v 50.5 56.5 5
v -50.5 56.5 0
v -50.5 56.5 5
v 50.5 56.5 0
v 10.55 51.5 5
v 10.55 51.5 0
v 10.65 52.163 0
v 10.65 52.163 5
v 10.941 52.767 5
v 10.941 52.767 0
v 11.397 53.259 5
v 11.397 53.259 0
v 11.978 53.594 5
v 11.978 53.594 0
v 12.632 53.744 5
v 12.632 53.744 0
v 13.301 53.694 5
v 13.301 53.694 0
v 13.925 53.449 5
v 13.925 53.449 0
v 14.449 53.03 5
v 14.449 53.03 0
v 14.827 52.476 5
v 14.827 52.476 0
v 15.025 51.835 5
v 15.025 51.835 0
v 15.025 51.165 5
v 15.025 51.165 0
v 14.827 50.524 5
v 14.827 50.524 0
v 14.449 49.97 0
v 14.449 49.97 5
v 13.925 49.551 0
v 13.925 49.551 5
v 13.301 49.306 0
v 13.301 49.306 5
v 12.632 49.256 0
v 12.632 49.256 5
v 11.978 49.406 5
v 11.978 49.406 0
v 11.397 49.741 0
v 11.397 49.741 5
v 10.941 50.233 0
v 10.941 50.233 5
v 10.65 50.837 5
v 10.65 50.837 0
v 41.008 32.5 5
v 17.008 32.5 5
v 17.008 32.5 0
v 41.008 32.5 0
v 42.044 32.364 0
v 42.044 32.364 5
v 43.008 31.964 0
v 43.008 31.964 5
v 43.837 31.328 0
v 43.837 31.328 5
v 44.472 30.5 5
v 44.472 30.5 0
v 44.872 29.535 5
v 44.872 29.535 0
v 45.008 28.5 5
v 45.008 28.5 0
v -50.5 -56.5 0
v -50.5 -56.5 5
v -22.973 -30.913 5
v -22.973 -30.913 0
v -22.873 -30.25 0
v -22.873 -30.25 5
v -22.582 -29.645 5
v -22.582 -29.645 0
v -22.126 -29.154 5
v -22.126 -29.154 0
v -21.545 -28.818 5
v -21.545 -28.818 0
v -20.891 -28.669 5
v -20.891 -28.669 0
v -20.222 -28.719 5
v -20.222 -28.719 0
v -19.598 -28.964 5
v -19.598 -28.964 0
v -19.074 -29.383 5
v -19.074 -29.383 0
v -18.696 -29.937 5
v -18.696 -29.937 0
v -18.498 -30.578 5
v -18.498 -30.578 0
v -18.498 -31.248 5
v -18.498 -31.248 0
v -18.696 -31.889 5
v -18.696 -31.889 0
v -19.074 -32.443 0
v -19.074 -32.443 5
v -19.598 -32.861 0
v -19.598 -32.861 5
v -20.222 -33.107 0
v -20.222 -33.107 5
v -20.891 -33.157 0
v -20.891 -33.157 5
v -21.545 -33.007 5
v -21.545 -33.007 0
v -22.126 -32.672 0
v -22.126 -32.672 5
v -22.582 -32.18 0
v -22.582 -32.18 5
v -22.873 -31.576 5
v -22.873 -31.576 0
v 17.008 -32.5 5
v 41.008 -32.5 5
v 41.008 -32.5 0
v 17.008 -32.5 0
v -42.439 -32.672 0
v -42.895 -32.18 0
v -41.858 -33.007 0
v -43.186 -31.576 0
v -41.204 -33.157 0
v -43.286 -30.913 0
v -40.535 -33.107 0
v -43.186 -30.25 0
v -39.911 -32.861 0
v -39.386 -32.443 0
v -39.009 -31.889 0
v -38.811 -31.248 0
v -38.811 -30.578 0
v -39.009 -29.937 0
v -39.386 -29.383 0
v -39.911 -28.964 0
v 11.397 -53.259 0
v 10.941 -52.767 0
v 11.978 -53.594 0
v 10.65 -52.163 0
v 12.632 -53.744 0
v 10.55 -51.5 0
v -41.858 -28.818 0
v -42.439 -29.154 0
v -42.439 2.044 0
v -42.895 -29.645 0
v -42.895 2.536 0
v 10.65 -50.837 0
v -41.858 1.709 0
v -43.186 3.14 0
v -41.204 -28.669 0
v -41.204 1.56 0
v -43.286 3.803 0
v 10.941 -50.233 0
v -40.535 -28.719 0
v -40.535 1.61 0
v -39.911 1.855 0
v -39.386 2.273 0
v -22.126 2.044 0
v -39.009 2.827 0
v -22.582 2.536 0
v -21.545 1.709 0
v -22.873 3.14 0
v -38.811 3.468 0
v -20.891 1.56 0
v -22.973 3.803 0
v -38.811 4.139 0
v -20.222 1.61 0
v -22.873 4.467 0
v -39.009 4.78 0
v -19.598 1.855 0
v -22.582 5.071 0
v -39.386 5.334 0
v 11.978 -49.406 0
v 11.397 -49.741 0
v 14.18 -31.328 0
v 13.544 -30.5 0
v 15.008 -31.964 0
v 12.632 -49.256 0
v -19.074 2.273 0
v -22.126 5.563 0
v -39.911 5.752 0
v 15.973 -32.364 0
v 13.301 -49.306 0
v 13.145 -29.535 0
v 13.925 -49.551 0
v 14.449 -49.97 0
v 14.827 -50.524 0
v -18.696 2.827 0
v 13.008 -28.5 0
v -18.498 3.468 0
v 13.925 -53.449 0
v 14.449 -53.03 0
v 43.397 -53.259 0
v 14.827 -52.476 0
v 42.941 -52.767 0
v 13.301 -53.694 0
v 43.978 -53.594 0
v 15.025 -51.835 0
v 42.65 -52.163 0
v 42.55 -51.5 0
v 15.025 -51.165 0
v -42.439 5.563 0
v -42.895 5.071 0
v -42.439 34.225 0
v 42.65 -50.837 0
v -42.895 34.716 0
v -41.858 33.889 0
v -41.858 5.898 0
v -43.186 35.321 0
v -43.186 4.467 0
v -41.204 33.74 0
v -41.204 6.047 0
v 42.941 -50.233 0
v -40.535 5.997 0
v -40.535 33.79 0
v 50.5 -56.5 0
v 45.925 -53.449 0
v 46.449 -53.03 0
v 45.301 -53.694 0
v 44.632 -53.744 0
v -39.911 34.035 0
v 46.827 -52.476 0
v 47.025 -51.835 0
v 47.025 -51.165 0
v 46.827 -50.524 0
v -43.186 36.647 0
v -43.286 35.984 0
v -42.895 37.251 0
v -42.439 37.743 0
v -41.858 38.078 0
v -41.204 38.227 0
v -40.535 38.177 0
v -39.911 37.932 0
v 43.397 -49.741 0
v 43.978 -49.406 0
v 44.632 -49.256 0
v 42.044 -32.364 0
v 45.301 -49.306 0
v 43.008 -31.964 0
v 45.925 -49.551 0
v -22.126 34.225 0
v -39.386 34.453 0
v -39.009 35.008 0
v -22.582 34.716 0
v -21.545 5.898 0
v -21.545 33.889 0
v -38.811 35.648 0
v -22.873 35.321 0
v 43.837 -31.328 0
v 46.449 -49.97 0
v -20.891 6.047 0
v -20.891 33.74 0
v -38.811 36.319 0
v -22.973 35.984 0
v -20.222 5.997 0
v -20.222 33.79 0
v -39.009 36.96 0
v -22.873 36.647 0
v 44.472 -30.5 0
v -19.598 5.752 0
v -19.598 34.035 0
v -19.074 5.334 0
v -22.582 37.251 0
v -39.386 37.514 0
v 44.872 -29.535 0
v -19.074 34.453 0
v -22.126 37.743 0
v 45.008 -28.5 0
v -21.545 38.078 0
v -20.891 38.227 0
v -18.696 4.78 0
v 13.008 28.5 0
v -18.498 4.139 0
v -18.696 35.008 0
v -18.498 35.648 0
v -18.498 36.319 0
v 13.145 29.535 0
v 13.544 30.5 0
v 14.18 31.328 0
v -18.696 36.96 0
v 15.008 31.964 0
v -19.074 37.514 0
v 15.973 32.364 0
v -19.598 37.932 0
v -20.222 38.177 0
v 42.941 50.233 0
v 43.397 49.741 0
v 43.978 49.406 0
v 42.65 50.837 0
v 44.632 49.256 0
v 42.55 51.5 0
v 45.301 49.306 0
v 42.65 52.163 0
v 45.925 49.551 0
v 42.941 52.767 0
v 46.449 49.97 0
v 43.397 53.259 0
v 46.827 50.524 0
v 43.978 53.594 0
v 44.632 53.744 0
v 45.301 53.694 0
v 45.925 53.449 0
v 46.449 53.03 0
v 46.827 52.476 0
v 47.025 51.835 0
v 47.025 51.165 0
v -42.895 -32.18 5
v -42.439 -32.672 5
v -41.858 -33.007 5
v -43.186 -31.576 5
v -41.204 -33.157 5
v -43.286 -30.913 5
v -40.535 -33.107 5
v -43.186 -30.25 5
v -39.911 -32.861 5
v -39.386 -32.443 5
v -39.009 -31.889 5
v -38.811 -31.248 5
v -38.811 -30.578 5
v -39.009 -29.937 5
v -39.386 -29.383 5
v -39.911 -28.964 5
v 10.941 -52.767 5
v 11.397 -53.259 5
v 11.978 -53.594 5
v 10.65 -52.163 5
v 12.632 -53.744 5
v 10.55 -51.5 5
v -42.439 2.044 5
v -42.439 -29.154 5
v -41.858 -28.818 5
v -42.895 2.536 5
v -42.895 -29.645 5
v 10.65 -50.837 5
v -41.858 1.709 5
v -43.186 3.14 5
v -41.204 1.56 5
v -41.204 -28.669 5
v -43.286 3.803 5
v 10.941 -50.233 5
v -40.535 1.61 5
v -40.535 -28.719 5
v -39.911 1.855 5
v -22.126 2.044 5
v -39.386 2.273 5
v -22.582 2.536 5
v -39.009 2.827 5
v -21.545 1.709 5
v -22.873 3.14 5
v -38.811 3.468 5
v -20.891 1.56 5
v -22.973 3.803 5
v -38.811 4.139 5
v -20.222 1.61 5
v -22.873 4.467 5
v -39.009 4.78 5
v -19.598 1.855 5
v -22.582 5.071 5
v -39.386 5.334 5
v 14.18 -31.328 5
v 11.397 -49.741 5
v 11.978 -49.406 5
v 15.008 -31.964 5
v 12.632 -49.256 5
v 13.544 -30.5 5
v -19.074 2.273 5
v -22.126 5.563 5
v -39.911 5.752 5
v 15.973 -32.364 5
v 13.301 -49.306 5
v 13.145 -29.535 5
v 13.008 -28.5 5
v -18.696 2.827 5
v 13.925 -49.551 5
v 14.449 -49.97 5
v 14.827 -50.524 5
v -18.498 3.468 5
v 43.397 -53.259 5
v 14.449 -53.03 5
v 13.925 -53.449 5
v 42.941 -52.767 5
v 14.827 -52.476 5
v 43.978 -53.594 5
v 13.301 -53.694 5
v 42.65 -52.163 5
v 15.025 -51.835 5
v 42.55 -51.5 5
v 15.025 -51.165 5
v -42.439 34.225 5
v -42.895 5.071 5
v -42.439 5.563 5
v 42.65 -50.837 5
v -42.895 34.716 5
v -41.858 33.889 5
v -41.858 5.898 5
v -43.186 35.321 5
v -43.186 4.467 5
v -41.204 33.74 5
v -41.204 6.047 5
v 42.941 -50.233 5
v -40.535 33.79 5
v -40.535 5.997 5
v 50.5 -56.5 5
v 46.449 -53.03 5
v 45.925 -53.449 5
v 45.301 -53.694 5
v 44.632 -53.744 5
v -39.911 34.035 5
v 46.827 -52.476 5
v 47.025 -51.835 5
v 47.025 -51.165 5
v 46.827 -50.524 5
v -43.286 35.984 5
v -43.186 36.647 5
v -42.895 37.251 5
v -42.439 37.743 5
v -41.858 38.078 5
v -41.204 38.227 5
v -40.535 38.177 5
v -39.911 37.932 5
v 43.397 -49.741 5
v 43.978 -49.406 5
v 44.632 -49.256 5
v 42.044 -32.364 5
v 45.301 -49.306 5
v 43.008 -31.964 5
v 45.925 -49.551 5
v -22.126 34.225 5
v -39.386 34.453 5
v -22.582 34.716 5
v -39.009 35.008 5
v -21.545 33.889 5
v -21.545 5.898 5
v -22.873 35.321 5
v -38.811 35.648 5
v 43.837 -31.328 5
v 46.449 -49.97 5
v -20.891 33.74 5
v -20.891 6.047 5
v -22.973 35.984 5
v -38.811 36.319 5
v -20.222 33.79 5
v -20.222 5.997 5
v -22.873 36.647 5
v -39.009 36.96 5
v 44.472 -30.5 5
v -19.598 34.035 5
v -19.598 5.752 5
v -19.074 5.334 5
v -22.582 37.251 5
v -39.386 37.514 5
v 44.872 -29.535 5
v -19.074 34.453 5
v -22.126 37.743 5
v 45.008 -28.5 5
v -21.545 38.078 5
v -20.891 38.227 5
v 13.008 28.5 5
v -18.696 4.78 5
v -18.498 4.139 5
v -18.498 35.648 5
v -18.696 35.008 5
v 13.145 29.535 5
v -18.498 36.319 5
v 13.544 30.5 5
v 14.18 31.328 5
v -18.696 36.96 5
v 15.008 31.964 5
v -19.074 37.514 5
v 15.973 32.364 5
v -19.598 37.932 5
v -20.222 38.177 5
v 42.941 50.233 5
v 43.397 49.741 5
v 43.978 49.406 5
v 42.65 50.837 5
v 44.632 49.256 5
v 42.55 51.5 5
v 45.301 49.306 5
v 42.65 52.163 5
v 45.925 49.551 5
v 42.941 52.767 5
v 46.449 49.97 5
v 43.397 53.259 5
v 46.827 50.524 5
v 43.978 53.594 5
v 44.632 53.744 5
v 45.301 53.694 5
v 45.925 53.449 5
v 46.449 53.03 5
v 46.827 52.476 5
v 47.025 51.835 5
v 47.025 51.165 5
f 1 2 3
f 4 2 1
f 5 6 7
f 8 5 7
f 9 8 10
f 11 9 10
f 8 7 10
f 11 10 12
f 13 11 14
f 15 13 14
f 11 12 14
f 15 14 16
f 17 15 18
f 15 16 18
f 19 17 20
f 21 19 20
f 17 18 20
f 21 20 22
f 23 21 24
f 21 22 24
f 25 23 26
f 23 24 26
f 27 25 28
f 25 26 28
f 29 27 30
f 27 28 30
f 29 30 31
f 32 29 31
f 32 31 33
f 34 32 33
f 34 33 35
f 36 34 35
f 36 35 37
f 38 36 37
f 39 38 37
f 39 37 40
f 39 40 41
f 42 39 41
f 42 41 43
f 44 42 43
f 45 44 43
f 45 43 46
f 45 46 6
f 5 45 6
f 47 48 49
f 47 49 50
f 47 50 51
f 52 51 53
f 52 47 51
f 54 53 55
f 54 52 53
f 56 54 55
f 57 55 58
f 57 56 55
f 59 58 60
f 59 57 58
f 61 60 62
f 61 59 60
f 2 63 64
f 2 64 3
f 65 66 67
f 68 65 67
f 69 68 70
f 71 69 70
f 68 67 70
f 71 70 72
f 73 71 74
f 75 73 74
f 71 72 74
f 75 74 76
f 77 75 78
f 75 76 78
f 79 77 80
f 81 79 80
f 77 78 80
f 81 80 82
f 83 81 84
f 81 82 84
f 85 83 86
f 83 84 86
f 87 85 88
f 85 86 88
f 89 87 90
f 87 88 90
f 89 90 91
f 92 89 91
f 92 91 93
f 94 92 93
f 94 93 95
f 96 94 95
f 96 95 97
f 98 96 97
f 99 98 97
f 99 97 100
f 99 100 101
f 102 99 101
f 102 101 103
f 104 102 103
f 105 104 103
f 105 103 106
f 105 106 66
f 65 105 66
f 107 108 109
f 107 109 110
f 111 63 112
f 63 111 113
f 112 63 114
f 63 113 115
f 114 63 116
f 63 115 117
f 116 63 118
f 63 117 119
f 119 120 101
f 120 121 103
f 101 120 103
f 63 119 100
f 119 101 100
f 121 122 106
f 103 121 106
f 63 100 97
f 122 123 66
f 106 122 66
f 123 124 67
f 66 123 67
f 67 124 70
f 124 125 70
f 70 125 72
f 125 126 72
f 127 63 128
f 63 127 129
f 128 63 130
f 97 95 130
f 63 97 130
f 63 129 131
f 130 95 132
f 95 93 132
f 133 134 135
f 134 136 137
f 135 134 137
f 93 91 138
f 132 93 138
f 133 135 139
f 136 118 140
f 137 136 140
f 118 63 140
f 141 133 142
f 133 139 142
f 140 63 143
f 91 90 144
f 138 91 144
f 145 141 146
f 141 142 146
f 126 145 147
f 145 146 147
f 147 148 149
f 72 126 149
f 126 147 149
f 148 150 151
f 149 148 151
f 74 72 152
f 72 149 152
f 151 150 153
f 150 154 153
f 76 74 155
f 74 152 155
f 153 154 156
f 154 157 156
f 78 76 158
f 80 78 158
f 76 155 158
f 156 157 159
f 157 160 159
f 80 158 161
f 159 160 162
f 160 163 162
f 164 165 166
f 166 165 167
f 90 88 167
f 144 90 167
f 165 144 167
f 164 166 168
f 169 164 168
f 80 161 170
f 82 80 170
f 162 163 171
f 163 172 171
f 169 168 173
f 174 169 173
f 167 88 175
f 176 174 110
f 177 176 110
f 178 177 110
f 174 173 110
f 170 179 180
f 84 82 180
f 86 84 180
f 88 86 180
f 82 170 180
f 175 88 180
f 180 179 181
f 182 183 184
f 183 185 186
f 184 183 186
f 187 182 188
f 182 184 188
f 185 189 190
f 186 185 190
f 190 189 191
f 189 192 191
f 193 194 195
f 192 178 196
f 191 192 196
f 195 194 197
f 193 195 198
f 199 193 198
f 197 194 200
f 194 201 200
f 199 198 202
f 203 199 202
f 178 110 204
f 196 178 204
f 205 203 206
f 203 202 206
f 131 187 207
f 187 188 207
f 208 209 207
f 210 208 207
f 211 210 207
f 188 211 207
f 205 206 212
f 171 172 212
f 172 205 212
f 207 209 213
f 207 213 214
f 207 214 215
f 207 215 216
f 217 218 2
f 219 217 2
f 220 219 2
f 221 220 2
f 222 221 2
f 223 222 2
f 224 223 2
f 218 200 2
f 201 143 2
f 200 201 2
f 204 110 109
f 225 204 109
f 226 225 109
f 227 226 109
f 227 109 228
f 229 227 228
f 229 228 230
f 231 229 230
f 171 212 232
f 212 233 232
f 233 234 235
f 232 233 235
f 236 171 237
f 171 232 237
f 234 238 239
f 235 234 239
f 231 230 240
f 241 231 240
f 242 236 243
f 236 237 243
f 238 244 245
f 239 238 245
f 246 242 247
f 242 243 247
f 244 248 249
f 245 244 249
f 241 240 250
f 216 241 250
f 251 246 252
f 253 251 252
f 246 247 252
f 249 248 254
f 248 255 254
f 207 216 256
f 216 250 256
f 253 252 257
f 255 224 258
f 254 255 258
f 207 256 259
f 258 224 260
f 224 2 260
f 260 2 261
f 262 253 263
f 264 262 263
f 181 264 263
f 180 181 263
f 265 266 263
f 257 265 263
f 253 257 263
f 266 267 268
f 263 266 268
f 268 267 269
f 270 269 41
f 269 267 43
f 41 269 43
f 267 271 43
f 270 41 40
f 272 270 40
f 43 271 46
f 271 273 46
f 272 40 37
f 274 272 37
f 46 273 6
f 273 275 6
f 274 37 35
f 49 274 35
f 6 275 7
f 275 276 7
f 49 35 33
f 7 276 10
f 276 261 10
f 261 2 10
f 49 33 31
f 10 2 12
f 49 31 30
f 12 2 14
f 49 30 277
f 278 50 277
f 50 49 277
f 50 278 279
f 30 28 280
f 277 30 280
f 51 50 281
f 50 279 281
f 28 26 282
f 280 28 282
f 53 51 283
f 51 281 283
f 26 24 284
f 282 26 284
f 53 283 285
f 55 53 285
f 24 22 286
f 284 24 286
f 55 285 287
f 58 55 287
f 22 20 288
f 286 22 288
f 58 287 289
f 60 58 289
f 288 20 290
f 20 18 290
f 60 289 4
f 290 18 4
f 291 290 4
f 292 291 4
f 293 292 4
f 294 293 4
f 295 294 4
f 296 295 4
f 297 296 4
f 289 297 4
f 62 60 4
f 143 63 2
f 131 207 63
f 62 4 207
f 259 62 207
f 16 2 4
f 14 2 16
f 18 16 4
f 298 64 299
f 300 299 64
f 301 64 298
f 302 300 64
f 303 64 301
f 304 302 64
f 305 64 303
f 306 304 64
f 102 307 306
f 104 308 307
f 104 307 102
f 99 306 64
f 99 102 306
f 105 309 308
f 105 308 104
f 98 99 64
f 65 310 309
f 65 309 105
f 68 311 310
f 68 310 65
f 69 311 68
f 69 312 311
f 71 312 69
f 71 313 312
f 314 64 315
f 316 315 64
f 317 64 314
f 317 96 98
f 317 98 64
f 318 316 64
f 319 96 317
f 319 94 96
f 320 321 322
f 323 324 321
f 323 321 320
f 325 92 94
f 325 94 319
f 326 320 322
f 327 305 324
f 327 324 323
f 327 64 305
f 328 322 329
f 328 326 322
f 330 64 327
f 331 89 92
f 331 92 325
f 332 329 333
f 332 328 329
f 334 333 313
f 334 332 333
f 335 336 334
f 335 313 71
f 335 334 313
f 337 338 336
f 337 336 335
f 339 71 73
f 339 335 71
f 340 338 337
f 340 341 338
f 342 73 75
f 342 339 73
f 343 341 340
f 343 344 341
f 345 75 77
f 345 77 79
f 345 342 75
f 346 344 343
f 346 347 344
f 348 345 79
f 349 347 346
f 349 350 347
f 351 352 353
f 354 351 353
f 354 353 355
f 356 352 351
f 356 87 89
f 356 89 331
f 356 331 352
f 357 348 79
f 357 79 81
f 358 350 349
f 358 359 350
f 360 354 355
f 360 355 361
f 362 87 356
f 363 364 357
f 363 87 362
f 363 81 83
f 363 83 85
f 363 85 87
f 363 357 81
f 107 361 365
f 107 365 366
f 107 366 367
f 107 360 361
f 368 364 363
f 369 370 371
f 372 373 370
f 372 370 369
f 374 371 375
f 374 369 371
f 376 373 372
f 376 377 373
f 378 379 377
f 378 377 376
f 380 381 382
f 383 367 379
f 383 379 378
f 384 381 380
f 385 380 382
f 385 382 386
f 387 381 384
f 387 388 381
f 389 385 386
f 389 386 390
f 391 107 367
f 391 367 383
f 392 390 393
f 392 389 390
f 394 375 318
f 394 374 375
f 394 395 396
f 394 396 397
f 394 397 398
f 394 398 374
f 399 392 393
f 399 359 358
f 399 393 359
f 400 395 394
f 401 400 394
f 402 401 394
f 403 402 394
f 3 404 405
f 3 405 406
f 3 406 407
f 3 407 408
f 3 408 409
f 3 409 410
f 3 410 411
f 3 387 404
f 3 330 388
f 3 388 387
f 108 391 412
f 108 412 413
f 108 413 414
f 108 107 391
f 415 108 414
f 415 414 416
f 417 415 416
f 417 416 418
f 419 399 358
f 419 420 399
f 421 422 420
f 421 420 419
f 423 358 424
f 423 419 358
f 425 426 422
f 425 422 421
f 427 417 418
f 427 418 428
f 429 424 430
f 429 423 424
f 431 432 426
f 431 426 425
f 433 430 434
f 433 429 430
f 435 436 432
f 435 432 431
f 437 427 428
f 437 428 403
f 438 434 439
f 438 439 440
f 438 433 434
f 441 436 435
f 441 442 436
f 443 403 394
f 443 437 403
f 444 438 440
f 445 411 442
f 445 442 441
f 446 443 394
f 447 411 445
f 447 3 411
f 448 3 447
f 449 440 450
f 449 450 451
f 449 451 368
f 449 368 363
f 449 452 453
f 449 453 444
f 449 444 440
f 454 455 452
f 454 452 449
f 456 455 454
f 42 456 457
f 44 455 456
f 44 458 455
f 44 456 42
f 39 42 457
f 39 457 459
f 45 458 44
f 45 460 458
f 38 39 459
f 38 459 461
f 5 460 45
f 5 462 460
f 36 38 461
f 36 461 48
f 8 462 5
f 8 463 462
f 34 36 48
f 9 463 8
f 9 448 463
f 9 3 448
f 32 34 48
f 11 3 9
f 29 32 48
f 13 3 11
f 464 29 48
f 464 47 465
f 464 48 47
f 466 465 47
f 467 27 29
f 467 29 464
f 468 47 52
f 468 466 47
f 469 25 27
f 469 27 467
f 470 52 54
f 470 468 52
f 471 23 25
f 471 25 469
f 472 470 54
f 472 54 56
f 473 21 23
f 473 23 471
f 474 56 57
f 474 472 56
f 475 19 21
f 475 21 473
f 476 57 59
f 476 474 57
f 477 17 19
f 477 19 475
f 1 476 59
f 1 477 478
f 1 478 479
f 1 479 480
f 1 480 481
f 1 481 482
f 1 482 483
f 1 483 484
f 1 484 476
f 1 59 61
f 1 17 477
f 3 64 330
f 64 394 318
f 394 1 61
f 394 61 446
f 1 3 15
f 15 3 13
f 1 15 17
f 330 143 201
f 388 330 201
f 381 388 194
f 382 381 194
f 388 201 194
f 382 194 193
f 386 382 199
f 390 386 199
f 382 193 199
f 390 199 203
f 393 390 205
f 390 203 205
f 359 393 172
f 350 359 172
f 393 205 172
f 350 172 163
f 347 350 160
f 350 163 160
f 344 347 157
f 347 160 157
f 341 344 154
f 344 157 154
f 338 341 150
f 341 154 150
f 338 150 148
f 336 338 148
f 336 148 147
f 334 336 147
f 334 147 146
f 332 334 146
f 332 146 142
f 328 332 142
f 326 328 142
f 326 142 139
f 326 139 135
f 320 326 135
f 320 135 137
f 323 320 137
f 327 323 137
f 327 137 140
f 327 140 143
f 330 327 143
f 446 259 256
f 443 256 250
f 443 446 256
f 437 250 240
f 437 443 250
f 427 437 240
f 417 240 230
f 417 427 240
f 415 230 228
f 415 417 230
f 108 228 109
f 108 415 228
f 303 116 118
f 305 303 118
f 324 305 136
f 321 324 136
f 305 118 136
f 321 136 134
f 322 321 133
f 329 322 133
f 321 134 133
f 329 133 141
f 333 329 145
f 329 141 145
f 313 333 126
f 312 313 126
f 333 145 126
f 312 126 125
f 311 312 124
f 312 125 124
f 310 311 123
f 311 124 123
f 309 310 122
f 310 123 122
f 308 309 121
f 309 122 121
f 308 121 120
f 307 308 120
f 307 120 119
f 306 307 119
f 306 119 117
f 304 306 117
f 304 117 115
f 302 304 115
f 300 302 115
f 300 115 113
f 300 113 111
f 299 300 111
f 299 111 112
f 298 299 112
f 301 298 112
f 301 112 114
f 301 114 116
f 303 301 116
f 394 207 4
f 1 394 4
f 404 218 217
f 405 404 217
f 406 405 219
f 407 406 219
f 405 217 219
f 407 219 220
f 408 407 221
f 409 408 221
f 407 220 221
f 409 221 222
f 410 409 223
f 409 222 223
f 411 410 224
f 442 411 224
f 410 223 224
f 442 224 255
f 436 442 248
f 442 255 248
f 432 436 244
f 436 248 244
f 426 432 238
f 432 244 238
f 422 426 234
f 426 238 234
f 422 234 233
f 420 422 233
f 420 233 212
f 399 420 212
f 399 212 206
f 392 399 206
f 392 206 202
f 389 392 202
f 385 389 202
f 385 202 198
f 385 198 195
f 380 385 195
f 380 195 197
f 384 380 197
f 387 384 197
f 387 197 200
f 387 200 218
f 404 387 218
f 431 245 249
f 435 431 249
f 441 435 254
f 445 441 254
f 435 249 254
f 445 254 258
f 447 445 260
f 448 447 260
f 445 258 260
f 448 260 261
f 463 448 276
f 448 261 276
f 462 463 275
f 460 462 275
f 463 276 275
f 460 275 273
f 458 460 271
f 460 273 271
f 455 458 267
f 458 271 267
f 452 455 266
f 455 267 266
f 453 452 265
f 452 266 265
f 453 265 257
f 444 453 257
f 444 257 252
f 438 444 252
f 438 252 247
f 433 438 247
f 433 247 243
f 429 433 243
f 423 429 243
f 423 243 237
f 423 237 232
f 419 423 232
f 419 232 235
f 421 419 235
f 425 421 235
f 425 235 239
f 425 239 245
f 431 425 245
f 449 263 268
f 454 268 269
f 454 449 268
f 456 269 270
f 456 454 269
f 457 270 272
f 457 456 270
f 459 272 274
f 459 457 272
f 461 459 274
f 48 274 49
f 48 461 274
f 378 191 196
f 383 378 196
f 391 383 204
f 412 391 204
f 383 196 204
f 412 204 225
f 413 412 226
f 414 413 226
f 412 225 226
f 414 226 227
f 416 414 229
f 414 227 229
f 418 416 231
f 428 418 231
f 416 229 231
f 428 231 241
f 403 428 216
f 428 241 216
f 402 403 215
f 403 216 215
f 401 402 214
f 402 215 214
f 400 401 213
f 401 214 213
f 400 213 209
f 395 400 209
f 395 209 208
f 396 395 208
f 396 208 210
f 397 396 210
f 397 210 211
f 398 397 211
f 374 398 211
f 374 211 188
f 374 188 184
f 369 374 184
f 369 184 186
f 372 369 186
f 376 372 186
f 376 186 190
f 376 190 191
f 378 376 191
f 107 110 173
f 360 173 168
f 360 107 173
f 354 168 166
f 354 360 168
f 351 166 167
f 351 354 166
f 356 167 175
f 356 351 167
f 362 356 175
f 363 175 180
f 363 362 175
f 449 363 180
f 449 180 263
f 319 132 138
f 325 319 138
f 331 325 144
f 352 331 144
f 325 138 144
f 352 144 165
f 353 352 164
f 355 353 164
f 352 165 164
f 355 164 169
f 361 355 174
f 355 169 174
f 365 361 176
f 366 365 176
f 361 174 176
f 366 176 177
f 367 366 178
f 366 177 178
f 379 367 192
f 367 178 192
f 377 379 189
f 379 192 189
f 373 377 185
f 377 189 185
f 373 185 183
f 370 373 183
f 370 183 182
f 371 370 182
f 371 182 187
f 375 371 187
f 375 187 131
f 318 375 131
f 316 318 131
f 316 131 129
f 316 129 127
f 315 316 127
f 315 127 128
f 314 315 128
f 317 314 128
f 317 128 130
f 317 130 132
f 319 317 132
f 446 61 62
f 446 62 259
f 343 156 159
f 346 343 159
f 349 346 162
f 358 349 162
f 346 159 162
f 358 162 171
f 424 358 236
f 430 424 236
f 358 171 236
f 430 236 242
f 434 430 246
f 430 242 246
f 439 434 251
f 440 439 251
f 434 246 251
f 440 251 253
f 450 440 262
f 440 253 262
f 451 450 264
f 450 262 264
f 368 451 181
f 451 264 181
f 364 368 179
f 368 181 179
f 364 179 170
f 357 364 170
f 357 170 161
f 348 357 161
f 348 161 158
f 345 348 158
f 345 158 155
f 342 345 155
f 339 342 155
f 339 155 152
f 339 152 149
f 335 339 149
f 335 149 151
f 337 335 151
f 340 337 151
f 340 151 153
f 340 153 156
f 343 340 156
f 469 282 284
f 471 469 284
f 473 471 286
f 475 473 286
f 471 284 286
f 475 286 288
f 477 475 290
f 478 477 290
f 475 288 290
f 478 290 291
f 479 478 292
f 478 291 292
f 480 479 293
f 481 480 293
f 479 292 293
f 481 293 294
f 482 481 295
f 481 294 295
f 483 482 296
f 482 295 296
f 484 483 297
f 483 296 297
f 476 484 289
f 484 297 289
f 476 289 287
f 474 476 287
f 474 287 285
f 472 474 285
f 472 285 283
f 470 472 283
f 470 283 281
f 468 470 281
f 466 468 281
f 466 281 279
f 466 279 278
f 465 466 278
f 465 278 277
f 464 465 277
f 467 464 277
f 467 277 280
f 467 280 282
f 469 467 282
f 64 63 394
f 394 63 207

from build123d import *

# Parameters (mm, degrees)
ESQUISSE1_W          = 101
ESQUISSE1_H          = 113
BOSS_EXTRU_1_DEPTH   = 5
D_GAGEMENT_M42_D     = 4.5
M4_CLEARANCE_HOLE1_D = 4.5
CUT_EXTRUDE1_DEPTH   = 76.944058359


with BuildPart() as part:
    # Esquisse1 → Boss.-Extru.1 (new body)
    with BuildSketch(Plane.XY):
        Rectangle(ESQUISSE1_W, ESQUISSE1_H)
    extrude(amount=BOSS_EXTRU_1_DEPTH)

    # Dégagement M42 (through all)
    with Locations(Plane.XY.offset(5)):
        with Locations((-20.723129893, -30.91293976), (-20.723129893, 3.803464199), (-41.035821543, 3.803464199), (-41.035821543, -30.91293976), (-41.035821543, 35.983767161), (-20.723129893, 35.983767161)):
            Hole(D_GAGEMENT_M42_D / 2)

    # M4 Clearance Hole1 (through all)
    with Locations(Plane.XY.offset(5)):
        with Locations((44.8, 51.5), (12.8, 51.5), (12.8, -51.5), (44.8, -51.5)):
            Hole(M4_CLEARANCE_HOLE1_D / 2)

    # Sketch3 → Cut-Extrude1 (cut, through all)
    with BuildSketch(Plane.XY.offset(5)):
        with BuildLine():
            Line((45.008341295, 28.5), (45.008341295, -28.5))
            ThreePointArc((45.008341295, -28.5), (43.83676842, -31.328427125), (41.008341295, -32.5))
            Line((41.008341295, -32.5), (17.008341295, -32.5))
            ThreePointArc((17.008341295, -32.5), (14.17991417, -31.328427125), (13.008341295, -28.5))
            Line((13.008341295, -28.5), (13.008341295, 28.5))
            ThreePointArc((13.008341295, 28.5), (14.17991417, 31.328427125), (17.008341295, 32.5))
            Line((17.008341295, 32.5), (41.008341295, 32.5))
            ThreePointArc((41.008341295, 32.5), (43.83676842, 31.328427125), (45.008341295, 28.5))
        make_face()
    extrude(amount=-CUT_EXTRUDE1_DEPTH, mode=Mode.SUBTRACT)


solid = part.part
